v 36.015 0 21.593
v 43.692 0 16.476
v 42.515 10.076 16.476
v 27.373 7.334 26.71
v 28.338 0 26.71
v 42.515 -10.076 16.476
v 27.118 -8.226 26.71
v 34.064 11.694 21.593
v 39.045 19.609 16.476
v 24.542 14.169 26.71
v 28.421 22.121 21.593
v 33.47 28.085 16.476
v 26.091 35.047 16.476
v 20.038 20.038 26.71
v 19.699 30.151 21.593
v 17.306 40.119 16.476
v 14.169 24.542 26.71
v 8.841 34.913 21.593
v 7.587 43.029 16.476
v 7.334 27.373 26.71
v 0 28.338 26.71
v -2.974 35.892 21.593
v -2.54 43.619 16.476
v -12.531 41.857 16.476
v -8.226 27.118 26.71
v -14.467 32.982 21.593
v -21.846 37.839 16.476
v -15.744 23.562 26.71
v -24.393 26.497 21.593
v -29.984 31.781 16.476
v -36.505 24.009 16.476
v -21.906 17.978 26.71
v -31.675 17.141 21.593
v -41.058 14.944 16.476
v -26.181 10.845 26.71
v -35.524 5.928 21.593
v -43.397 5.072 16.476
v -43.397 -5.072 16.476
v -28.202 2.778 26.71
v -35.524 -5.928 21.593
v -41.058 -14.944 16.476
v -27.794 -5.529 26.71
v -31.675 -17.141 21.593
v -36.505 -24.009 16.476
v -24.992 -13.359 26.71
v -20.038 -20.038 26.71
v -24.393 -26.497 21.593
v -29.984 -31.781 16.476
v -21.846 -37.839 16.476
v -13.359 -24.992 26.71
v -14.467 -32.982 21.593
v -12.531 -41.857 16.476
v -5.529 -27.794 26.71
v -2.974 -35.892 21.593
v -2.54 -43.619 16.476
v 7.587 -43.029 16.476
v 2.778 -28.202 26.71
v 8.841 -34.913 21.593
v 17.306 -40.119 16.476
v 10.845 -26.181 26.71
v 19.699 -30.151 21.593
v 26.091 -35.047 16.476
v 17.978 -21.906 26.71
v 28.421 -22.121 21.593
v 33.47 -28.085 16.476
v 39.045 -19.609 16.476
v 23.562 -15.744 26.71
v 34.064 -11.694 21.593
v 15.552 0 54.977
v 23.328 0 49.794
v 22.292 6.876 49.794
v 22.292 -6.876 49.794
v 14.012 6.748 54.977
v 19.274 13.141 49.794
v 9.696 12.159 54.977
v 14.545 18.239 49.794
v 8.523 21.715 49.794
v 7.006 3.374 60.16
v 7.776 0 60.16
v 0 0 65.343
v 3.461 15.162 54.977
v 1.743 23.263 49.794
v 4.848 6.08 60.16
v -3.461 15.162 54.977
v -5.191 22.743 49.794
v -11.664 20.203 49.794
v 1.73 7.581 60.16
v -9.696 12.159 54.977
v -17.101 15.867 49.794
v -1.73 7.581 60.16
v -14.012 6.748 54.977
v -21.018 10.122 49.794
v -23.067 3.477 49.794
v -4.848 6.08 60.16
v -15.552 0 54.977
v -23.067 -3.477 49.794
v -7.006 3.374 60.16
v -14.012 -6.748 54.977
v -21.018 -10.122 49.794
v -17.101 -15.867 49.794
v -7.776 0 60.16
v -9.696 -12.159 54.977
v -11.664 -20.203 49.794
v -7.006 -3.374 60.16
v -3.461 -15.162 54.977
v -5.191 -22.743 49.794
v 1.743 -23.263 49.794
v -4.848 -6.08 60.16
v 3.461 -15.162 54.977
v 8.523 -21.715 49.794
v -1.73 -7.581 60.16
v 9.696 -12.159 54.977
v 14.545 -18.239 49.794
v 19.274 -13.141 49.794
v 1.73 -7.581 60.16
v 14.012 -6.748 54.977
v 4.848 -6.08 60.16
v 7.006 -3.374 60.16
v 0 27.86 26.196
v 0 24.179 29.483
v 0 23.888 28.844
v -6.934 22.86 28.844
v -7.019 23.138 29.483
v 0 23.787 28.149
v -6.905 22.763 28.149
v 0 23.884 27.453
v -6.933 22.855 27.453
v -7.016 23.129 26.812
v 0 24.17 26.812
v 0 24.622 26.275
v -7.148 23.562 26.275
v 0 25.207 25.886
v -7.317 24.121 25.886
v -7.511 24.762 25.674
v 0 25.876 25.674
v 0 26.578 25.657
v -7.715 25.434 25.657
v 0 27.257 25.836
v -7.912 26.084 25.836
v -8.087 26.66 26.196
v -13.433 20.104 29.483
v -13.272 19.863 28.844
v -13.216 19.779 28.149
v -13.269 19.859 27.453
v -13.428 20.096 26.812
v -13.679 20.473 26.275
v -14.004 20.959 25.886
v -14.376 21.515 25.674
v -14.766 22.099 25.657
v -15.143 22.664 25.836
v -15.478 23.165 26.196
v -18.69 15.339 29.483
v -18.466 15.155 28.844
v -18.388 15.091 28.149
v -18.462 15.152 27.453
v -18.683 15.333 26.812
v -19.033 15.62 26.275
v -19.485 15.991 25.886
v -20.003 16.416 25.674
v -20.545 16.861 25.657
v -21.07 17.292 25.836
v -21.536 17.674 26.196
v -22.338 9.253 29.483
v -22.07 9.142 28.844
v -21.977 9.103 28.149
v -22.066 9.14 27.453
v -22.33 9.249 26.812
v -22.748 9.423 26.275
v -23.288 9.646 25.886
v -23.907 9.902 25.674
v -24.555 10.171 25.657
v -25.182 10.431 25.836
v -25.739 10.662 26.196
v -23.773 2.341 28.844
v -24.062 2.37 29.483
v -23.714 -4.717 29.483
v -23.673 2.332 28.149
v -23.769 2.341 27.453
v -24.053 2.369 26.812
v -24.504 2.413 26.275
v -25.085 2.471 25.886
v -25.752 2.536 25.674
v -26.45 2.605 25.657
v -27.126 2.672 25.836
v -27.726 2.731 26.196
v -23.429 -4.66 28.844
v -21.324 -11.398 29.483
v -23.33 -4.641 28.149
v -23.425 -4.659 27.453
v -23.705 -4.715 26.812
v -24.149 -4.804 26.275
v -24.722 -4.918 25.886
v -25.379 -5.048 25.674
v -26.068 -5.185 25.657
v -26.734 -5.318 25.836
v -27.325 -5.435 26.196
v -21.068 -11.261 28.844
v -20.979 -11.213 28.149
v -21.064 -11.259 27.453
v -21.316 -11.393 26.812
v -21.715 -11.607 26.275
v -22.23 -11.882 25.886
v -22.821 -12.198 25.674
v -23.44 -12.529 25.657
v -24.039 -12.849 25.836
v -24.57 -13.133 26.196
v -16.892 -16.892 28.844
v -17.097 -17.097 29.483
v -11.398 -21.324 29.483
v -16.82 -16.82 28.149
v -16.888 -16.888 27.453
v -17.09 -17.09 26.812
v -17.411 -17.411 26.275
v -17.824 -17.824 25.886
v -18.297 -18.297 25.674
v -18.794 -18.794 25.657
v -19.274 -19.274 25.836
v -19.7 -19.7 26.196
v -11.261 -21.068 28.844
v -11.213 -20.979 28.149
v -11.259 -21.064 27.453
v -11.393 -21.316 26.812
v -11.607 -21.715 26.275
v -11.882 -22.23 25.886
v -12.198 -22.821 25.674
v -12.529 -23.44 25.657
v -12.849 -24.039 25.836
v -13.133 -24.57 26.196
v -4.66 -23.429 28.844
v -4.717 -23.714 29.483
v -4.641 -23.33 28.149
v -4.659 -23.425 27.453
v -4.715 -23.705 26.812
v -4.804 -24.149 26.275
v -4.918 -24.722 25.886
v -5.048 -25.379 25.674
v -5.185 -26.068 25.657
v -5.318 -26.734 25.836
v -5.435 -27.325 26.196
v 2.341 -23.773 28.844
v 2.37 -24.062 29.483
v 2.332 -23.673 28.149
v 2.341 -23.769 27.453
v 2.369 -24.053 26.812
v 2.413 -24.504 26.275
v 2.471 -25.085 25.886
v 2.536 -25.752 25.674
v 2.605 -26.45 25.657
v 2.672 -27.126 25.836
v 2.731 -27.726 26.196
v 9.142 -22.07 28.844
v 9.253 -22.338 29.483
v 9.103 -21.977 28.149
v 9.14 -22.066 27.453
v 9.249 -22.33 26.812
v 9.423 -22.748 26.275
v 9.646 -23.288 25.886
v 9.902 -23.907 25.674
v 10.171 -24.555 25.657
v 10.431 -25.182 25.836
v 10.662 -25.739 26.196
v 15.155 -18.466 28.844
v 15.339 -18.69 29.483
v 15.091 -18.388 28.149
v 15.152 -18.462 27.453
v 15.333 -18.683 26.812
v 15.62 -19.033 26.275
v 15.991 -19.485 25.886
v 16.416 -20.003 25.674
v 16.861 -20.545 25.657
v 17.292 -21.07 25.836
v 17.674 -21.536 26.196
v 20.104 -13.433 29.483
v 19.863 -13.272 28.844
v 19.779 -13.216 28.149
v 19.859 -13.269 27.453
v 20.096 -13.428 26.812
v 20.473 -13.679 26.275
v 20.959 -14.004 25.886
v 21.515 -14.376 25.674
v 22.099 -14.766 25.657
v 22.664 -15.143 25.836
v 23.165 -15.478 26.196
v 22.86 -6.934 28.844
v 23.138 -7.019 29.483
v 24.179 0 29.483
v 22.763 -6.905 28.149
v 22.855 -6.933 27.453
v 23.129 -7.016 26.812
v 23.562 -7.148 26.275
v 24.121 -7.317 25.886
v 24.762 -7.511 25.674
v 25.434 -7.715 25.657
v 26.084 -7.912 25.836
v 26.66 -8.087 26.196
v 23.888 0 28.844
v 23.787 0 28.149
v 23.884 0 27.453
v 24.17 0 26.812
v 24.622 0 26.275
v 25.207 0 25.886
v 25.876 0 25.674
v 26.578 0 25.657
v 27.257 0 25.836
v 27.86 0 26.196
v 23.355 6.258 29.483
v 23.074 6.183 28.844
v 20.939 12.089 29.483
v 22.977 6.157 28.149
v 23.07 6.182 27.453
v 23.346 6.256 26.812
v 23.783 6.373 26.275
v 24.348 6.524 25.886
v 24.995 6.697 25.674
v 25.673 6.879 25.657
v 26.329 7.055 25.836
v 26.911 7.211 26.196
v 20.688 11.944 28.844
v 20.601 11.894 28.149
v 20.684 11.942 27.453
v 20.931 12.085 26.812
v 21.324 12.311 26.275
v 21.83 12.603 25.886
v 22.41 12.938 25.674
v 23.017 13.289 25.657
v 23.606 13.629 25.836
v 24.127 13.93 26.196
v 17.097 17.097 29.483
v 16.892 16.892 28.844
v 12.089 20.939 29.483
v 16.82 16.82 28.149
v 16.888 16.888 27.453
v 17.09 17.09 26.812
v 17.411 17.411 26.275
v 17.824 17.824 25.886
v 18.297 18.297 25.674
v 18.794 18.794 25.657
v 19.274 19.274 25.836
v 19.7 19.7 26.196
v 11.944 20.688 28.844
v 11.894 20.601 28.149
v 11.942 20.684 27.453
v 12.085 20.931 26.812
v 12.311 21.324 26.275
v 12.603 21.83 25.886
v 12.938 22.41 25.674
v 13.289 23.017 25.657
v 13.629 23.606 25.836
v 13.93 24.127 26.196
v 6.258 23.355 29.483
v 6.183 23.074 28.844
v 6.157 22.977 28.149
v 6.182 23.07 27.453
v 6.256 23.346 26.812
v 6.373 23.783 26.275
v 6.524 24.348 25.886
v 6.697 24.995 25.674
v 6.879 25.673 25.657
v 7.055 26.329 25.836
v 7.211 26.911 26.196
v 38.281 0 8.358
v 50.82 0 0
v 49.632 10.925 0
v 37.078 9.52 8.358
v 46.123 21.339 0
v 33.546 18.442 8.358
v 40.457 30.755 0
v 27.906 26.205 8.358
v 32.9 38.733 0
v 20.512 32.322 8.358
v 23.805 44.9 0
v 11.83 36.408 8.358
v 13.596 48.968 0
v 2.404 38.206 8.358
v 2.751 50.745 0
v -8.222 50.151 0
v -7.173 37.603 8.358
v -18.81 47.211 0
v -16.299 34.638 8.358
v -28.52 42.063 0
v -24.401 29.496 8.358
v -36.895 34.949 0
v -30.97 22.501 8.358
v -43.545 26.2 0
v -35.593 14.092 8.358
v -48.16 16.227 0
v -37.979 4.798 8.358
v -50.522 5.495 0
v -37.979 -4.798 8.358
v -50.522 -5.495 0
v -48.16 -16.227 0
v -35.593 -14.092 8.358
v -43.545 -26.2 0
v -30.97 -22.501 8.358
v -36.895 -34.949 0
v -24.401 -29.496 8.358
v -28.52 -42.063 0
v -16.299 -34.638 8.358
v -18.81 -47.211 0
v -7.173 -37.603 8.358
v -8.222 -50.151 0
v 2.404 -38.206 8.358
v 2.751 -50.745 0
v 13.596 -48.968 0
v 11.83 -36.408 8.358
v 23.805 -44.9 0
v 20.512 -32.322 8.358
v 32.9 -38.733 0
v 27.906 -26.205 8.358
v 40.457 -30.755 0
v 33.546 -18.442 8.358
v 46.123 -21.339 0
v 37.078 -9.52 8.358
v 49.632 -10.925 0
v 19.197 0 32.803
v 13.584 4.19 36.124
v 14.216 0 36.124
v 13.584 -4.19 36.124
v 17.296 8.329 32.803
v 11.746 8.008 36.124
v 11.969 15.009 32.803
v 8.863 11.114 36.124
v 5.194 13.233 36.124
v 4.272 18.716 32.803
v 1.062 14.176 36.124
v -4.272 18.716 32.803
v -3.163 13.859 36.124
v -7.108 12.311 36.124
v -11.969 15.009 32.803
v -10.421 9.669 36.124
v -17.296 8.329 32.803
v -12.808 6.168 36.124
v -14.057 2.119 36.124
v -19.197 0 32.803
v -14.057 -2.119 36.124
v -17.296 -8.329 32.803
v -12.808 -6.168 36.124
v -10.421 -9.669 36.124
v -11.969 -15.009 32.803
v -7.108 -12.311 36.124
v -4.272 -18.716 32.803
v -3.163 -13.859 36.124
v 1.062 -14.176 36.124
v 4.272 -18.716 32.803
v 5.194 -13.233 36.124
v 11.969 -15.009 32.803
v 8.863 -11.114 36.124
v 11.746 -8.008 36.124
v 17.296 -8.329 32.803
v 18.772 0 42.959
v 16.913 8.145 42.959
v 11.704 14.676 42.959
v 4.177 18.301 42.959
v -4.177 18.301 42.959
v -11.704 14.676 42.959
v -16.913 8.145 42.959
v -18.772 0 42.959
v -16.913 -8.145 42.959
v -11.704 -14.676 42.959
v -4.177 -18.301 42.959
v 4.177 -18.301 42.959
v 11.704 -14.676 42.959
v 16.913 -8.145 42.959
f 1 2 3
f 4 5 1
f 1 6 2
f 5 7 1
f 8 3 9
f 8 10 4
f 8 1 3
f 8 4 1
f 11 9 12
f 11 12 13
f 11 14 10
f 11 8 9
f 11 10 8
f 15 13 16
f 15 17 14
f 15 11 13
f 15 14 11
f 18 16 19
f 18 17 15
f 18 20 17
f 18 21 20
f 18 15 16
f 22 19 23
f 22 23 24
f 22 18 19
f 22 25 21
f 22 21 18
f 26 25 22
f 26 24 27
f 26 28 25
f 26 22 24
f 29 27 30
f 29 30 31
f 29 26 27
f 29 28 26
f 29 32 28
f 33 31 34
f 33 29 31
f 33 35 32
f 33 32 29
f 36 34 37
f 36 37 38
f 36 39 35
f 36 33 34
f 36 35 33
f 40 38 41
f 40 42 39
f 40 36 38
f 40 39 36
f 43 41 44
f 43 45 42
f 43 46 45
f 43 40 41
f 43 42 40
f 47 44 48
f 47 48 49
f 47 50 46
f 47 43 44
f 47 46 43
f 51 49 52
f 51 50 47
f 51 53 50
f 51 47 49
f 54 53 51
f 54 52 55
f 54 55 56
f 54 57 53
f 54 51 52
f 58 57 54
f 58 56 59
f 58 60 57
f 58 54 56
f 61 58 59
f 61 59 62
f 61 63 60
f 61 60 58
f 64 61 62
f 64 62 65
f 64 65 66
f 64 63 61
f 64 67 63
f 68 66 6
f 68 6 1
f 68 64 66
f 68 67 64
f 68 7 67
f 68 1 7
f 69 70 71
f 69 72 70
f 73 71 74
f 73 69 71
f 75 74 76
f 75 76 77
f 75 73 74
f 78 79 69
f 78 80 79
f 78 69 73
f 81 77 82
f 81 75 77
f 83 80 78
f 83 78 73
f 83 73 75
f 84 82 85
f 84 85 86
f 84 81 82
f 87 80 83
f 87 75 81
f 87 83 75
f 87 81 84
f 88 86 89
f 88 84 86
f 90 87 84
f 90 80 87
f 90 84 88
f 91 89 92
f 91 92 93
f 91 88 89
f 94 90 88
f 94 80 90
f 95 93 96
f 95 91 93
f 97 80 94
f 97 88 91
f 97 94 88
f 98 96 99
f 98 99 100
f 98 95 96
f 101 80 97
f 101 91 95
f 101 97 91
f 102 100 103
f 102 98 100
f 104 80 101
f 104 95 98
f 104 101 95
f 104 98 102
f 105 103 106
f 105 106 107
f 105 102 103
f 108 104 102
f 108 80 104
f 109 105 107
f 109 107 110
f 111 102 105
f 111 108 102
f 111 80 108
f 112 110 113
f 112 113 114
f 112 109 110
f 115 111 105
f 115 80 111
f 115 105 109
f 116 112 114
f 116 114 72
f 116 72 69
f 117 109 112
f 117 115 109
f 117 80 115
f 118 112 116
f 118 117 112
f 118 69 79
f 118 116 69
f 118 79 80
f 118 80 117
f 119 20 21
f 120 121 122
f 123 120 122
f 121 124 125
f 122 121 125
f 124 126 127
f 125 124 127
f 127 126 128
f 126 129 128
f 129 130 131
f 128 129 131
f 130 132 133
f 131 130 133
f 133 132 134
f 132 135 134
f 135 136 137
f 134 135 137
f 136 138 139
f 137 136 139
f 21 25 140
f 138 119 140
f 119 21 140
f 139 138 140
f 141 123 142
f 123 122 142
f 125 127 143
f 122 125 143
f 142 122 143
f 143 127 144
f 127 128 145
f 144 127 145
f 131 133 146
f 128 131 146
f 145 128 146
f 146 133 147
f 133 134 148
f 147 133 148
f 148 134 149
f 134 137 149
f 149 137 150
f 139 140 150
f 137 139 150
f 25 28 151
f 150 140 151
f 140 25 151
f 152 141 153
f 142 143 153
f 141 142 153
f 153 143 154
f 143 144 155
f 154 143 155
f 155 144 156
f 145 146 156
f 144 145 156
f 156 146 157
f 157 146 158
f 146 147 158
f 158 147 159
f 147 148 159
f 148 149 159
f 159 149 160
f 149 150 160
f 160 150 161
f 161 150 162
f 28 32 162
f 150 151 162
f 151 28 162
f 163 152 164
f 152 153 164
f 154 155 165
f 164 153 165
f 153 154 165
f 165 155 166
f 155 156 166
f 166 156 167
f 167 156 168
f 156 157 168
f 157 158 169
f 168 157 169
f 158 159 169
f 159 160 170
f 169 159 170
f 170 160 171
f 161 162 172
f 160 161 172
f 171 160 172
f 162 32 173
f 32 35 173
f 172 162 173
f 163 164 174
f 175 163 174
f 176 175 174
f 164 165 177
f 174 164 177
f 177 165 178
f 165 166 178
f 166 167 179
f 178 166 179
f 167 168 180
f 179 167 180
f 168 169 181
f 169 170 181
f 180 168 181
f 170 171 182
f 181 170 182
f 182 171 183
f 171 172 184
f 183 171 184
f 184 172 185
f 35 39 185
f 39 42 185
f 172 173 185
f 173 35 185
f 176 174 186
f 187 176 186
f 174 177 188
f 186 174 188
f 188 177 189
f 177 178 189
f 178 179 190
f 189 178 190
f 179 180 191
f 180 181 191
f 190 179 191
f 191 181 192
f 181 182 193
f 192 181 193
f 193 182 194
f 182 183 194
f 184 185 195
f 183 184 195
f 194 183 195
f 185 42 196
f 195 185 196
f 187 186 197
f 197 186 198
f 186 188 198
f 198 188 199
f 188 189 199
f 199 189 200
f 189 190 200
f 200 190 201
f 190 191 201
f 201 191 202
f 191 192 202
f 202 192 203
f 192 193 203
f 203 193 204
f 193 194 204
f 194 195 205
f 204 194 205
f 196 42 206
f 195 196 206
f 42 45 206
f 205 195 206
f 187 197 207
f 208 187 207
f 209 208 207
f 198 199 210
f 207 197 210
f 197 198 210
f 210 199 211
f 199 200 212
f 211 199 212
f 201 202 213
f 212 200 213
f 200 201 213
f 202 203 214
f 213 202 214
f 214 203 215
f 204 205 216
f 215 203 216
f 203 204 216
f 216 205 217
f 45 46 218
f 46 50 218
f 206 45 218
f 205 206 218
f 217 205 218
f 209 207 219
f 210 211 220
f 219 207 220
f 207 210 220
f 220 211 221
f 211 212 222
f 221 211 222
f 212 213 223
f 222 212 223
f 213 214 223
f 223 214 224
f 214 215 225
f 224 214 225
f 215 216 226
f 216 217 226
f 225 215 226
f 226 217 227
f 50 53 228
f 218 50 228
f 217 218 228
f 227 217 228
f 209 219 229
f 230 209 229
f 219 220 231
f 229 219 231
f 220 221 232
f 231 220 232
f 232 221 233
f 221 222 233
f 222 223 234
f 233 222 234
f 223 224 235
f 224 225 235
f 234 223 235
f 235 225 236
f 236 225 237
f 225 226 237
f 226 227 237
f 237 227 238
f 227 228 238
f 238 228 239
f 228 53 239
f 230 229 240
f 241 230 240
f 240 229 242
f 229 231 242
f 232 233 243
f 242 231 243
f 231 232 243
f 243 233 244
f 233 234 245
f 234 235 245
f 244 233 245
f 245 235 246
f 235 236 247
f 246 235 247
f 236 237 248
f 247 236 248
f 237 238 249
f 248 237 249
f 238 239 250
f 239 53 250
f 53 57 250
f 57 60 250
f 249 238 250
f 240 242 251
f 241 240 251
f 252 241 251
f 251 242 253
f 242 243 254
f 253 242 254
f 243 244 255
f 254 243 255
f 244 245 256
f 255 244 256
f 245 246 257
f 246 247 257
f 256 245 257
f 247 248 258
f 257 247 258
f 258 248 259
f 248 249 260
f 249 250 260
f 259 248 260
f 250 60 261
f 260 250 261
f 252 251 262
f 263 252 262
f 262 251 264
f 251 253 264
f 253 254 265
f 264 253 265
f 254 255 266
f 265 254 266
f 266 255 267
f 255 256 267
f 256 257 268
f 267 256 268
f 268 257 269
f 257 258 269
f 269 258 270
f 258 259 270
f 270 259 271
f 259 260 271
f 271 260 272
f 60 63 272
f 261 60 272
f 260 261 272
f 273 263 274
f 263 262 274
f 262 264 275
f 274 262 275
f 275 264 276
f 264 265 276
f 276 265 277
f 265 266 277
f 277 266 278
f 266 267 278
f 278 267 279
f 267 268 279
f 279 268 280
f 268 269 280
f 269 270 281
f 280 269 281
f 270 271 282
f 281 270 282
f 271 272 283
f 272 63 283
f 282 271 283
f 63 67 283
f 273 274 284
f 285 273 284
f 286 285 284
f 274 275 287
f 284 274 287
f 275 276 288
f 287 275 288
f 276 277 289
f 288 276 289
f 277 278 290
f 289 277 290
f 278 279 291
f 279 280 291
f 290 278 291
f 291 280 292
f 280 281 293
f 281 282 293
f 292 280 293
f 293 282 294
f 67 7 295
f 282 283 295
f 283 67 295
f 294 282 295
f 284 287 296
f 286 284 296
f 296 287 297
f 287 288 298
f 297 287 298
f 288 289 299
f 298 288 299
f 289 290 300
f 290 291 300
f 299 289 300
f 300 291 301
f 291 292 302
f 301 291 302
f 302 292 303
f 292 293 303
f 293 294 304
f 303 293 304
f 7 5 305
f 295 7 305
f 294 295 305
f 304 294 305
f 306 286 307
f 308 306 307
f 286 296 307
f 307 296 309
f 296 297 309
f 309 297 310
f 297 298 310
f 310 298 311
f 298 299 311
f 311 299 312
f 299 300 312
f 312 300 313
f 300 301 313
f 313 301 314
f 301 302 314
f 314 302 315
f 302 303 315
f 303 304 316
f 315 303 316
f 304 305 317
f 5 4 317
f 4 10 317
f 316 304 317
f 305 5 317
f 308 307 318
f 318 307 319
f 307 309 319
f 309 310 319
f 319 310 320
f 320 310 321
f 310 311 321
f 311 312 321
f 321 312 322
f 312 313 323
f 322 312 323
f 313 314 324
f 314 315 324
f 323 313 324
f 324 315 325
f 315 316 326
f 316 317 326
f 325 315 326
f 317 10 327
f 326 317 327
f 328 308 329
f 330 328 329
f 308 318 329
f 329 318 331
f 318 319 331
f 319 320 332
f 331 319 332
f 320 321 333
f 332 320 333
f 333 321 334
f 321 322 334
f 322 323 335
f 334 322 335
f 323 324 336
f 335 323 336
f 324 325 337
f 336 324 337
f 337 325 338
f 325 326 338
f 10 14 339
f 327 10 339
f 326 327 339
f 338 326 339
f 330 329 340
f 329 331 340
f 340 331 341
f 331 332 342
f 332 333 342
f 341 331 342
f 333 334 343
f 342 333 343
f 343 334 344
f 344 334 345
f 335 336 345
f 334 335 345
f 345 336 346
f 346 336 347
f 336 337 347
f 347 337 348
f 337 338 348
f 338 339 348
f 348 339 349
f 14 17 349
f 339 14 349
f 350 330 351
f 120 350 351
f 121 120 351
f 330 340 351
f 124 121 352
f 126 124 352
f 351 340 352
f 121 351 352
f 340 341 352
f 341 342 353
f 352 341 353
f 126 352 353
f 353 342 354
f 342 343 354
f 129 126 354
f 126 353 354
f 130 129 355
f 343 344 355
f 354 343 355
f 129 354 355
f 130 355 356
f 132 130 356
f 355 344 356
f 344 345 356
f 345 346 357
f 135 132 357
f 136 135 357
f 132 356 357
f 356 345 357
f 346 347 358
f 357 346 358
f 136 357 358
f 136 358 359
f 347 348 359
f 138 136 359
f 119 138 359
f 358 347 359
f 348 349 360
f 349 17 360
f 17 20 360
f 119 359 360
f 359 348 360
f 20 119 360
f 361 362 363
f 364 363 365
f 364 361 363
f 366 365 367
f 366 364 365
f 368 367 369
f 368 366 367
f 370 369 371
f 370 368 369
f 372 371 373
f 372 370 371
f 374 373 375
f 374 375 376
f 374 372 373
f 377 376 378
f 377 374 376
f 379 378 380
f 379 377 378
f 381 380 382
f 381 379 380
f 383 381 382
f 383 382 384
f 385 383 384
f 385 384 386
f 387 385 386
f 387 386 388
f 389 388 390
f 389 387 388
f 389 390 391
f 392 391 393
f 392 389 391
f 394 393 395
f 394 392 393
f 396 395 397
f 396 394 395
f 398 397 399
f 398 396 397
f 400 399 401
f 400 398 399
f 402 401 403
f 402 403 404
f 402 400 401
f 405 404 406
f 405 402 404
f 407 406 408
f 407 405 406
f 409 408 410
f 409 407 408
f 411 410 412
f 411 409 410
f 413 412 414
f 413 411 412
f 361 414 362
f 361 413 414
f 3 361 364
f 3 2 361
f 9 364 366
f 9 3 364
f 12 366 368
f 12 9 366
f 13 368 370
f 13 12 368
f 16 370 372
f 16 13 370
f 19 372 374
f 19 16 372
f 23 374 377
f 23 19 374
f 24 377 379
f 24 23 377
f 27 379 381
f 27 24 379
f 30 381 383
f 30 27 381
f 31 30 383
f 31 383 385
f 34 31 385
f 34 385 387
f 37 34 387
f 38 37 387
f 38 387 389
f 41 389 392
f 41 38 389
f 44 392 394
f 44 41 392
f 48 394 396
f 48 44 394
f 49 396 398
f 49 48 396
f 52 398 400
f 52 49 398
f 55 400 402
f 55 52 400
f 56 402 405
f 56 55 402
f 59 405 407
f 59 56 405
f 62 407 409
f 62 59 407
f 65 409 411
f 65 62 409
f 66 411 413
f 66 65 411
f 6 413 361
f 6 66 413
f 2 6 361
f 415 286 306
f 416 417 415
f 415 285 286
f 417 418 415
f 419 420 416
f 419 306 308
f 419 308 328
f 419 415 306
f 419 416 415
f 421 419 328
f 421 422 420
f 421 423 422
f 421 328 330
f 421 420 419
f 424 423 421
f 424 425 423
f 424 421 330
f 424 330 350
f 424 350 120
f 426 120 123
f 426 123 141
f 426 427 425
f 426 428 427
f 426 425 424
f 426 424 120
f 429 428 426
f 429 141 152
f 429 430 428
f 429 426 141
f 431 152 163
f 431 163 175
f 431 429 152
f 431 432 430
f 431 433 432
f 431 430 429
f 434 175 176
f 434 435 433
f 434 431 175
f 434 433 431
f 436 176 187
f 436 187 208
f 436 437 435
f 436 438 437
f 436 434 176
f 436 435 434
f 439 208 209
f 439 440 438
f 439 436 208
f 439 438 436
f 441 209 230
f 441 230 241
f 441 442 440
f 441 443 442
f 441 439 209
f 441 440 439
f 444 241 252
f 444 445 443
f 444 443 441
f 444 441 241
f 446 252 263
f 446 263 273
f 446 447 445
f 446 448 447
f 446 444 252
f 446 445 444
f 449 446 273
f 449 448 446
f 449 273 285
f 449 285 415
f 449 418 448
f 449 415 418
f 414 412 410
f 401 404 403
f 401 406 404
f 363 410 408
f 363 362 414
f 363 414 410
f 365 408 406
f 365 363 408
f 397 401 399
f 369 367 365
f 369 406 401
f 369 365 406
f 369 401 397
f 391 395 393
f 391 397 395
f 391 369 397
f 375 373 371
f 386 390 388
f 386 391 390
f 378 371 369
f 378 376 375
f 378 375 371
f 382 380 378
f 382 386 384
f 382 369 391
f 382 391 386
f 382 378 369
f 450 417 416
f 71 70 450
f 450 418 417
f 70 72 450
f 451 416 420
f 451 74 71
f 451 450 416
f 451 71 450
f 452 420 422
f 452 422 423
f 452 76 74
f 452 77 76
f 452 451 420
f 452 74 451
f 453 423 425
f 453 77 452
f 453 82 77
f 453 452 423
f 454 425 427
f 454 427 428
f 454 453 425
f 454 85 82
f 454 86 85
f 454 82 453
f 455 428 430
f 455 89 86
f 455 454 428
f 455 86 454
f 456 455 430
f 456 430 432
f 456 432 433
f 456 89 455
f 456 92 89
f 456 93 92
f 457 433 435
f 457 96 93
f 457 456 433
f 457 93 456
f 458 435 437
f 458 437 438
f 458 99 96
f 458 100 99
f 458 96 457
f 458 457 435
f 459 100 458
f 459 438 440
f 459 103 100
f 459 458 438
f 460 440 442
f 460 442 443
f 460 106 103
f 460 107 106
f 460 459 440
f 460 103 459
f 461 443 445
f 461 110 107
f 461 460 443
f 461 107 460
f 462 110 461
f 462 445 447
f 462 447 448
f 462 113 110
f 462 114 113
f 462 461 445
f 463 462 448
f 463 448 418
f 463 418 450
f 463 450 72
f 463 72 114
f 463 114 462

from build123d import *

# Parameters (mm, degrees)
F2_R = 2.5


with BuildPart() as f1:
    # F0 (on Front) → F1 (revolve)
    with BuildSketch(Plane.XZ):
        Polygon((0, 65.34344), (0, 0), (50.819985, 0), (38.281162, 8.357699), (43.692497, 16.476175), (14.215877, 36.123689), (23.327958, 49.79429), align=None)
    revolve(axis=Axis((0, 0, 32.67172), (0, 0, 1)))

    # F2 (on Right) → F3 (revolve, cut)
    with BuildSketch(Plane.YZ):
        with Locations((26.287429, 28.140074)):
            Circle(F2_R)
    revolve(axis=Axis((0, 0, 32.67172), (0, 0, 1)), mode=Mode.SUBTRACT)


solid = f1.part
